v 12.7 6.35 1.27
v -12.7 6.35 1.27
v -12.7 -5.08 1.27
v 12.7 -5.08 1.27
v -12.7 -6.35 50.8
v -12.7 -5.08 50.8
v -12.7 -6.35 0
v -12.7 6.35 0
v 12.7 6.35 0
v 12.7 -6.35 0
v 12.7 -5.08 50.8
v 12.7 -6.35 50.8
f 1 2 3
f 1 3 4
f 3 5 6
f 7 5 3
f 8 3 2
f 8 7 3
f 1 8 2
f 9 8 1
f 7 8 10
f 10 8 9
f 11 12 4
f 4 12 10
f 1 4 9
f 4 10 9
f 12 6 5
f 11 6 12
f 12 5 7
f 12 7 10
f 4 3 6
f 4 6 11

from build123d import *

# Parameters (mm, degrees)
SKETCH1_W           = 25.4
SKETCH1_H           = 12.7
BOSS_EXTRUDE1_DEPTH = 50.8
SHELL1_T            = -1.27


with BuildPart() as part:
    # Sketch1 → Boss-Extrude1 (new body)
    with BuildSketch(Plane.XY):
        Rectangle(SKETCH1_W, SKETCH1_H)
    extrude(amount=BOSS_EXTRUDE1_DEPTH)

    # Shell1
    shell1_openings = [part.faces().sort_by_distance(p)[0] for p in [
        (0, 0, 50.8),
        (-12.7, 0, 25.4),
        (0, 6.35, 25.4),
        (12.7, 0, 25.4),
    ]]
    offset(amount=SHELL1_T, openings=shell1_openings, kind=Kind.INTERSECTION)


solid = part.part
